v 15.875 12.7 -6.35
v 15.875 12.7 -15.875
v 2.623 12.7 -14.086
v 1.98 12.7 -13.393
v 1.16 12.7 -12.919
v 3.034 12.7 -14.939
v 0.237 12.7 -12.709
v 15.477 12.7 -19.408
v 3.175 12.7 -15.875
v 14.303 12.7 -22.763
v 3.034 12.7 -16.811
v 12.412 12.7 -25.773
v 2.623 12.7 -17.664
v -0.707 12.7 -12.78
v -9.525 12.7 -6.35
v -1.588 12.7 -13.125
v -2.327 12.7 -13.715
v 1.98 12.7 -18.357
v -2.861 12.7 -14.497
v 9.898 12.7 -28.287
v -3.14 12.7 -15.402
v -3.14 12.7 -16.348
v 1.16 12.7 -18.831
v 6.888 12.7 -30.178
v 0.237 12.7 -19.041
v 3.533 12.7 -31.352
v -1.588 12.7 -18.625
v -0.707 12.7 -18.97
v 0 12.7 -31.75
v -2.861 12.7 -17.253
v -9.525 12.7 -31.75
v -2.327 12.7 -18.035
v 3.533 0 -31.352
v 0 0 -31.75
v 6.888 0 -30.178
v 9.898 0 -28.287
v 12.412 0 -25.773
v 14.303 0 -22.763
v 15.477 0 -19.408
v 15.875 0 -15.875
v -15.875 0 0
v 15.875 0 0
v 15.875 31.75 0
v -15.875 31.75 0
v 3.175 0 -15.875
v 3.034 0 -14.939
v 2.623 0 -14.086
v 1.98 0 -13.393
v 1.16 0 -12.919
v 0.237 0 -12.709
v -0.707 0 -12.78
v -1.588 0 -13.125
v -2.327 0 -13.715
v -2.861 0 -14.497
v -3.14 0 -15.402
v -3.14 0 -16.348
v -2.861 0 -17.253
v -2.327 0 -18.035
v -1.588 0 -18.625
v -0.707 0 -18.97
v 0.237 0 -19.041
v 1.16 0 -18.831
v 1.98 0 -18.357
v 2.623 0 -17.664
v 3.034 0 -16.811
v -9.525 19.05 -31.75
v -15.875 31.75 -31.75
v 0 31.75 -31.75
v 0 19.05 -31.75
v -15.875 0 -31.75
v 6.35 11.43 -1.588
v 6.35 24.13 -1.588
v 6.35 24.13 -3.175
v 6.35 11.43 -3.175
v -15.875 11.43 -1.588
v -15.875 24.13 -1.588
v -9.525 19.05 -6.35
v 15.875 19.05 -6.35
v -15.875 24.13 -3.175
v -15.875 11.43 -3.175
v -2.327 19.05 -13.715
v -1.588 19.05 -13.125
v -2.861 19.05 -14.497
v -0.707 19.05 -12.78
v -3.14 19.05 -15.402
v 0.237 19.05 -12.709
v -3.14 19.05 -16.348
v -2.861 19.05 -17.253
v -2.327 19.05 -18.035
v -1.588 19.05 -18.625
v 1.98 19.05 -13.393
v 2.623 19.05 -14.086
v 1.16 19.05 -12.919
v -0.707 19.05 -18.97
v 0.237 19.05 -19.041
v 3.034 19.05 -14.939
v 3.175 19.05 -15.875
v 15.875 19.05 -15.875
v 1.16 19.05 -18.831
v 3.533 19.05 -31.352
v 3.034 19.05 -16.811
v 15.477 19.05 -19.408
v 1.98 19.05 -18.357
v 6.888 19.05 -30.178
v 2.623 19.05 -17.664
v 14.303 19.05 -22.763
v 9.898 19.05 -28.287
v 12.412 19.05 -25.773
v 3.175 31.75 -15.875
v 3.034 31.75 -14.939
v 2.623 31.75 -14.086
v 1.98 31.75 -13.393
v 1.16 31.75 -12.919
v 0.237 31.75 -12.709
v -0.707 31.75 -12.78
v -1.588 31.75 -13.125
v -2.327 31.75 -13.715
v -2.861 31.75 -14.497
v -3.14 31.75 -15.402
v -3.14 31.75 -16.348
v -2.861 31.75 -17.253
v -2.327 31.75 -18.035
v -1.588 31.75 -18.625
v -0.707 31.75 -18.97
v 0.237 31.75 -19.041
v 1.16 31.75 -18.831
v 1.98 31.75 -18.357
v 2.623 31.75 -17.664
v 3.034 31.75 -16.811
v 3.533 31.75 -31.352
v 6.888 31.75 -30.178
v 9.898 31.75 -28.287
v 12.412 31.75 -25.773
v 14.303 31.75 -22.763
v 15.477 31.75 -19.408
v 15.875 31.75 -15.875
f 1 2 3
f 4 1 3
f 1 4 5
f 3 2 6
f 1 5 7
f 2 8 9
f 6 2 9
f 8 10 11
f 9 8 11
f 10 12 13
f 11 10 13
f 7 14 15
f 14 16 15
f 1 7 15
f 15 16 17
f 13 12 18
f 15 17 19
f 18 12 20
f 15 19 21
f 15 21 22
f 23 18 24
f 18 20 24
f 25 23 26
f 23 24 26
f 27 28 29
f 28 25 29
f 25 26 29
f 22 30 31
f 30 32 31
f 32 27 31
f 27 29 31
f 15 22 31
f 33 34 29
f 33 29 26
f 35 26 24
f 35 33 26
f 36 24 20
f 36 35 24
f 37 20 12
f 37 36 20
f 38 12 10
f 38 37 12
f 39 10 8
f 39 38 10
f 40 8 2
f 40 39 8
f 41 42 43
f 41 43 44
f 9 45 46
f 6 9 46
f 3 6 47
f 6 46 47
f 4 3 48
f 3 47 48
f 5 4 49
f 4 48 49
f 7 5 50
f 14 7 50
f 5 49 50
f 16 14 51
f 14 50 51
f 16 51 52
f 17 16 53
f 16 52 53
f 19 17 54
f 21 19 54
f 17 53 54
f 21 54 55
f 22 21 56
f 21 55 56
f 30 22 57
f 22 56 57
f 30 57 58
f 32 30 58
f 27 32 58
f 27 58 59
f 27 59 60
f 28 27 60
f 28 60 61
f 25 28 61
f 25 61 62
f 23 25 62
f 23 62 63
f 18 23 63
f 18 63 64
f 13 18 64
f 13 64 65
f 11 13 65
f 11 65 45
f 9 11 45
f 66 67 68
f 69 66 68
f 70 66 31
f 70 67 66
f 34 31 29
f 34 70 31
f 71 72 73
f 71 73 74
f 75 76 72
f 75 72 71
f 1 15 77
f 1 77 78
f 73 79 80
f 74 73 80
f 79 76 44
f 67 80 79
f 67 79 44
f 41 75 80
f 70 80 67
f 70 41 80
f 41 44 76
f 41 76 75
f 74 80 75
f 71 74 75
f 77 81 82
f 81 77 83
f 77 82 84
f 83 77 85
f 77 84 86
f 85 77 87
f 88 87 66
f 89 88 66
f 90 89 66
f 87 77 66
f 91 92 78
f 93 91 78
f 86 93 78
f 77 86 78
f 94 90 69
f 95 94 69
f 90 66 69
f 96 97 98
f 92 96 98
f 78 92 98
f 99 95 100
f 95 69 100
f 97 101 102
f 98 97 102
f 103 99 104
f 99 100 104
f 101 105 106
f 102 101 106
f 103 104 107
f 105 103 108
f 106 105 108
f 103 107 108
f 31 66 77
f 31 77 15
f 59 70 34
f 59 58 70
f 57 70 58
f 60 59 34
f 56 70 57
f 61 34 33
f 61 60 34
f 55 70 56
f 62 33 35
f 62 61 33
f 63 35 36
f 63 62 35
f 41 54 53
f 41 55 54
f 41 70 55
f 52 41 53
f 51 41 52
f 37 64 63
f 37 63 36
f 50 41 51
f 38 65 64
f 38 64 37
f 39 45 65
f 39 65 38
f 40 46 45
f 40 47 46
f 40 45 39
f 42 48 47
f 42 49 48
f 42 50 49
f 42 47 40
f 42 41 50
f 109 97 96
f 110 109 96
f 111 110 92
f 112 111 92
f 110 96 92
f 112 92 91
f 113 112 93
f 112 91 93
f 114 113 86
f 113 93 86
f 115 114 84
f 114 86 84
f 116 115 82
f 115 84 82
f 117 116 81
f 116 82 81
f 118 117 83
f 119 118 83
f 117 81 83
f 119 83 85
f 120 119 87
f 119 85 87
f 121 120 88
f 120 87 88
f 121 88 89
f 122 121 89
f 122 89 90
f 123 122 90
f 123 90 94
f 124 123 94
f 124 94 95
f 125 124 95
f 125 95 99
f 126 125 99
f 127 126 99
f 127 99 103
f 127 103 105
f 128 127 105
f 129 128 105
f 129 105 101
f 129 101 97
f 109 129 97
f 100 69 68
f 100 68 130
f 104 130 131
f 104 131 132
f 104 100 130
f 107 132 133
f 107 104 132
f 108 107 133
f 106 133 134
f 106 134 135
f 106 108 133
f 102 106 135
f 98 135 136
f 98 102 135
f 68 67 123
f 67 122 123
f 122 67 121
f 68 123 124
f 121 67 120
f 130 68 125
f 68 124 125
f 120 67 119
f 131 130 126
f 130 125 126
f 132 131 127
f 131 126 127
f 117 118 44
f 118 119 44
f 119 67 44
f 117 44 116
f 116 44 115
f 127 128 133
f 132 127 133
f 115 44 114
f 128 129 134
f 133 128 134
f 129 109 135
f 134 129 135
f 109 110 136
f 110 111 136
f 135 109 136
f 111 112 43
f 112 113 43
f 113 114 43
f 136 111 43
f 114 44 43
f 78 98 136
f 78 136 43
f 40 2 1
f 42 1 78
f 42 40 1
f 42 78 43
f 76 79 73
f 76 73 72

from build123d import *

# Parameters (mm, degrees)
F0_R     = 3.175
F1_DEPTH = 31.75
F2_W     = 12.7
F2_H     = 1.5875
F3_DEPTH = 22.225
F4_W     = 15.875
F4_H     = 6.35
F4_W_2   = 9.525
F5_DEPTH = 25.4


with BuildPart() as f1:
    # F0 (on Front) → F1 (new body)
    with BuildSketch(Plane.XZ):
        with BuildLine():
            Line((15.875, -15.875), (15.875, 0))
            Line((15.875, 0), (-15.875, 0))
            Line((-15.875, 0), (-15.875, -31.75))
            Line((-15.875, -31.75), (0, -31.75))
            ThreePointArc((0, -31.75), (11.22532, -27.10032), (15.875, -15.875))
        make_face()
        with Locations((0, -15.875)):
            Circle(F0_R, mode=Mode.SUBTRACT)
    extrude(amount=-F1_DEPTH)

    # F2 (on face) → F3 (cut)
    with BuildSketch(Plane(origin=(-15.875, 0, 0), x_dir=(0, -1, 0), z_dir=(-1, 0, 0))):
        with Locations((-17.78, -2.38125)):
            Rectangle(F2_W, F2_H)
    extrude(amount=-F3_DEPTH, mode=Mode.SUBTRACT)

    # F4 (on face) → F5 (cut)
    with BuildSketch(Plane(origin=(0, 0, -31.75), x_dir=(1, 0, 0), z_dir=(0, 0, -1))):
        with Locations((7.9375, -15.875)):
            Rectangle(F4_W, F4_H)
        with Locations((-4.7625, -15.875)):
            Rectangle(F4_W_2, F4_H)
    extrude(amount=-F5_DEPTH, mode=Mode.SUBTRACT)


solid = f1.part
